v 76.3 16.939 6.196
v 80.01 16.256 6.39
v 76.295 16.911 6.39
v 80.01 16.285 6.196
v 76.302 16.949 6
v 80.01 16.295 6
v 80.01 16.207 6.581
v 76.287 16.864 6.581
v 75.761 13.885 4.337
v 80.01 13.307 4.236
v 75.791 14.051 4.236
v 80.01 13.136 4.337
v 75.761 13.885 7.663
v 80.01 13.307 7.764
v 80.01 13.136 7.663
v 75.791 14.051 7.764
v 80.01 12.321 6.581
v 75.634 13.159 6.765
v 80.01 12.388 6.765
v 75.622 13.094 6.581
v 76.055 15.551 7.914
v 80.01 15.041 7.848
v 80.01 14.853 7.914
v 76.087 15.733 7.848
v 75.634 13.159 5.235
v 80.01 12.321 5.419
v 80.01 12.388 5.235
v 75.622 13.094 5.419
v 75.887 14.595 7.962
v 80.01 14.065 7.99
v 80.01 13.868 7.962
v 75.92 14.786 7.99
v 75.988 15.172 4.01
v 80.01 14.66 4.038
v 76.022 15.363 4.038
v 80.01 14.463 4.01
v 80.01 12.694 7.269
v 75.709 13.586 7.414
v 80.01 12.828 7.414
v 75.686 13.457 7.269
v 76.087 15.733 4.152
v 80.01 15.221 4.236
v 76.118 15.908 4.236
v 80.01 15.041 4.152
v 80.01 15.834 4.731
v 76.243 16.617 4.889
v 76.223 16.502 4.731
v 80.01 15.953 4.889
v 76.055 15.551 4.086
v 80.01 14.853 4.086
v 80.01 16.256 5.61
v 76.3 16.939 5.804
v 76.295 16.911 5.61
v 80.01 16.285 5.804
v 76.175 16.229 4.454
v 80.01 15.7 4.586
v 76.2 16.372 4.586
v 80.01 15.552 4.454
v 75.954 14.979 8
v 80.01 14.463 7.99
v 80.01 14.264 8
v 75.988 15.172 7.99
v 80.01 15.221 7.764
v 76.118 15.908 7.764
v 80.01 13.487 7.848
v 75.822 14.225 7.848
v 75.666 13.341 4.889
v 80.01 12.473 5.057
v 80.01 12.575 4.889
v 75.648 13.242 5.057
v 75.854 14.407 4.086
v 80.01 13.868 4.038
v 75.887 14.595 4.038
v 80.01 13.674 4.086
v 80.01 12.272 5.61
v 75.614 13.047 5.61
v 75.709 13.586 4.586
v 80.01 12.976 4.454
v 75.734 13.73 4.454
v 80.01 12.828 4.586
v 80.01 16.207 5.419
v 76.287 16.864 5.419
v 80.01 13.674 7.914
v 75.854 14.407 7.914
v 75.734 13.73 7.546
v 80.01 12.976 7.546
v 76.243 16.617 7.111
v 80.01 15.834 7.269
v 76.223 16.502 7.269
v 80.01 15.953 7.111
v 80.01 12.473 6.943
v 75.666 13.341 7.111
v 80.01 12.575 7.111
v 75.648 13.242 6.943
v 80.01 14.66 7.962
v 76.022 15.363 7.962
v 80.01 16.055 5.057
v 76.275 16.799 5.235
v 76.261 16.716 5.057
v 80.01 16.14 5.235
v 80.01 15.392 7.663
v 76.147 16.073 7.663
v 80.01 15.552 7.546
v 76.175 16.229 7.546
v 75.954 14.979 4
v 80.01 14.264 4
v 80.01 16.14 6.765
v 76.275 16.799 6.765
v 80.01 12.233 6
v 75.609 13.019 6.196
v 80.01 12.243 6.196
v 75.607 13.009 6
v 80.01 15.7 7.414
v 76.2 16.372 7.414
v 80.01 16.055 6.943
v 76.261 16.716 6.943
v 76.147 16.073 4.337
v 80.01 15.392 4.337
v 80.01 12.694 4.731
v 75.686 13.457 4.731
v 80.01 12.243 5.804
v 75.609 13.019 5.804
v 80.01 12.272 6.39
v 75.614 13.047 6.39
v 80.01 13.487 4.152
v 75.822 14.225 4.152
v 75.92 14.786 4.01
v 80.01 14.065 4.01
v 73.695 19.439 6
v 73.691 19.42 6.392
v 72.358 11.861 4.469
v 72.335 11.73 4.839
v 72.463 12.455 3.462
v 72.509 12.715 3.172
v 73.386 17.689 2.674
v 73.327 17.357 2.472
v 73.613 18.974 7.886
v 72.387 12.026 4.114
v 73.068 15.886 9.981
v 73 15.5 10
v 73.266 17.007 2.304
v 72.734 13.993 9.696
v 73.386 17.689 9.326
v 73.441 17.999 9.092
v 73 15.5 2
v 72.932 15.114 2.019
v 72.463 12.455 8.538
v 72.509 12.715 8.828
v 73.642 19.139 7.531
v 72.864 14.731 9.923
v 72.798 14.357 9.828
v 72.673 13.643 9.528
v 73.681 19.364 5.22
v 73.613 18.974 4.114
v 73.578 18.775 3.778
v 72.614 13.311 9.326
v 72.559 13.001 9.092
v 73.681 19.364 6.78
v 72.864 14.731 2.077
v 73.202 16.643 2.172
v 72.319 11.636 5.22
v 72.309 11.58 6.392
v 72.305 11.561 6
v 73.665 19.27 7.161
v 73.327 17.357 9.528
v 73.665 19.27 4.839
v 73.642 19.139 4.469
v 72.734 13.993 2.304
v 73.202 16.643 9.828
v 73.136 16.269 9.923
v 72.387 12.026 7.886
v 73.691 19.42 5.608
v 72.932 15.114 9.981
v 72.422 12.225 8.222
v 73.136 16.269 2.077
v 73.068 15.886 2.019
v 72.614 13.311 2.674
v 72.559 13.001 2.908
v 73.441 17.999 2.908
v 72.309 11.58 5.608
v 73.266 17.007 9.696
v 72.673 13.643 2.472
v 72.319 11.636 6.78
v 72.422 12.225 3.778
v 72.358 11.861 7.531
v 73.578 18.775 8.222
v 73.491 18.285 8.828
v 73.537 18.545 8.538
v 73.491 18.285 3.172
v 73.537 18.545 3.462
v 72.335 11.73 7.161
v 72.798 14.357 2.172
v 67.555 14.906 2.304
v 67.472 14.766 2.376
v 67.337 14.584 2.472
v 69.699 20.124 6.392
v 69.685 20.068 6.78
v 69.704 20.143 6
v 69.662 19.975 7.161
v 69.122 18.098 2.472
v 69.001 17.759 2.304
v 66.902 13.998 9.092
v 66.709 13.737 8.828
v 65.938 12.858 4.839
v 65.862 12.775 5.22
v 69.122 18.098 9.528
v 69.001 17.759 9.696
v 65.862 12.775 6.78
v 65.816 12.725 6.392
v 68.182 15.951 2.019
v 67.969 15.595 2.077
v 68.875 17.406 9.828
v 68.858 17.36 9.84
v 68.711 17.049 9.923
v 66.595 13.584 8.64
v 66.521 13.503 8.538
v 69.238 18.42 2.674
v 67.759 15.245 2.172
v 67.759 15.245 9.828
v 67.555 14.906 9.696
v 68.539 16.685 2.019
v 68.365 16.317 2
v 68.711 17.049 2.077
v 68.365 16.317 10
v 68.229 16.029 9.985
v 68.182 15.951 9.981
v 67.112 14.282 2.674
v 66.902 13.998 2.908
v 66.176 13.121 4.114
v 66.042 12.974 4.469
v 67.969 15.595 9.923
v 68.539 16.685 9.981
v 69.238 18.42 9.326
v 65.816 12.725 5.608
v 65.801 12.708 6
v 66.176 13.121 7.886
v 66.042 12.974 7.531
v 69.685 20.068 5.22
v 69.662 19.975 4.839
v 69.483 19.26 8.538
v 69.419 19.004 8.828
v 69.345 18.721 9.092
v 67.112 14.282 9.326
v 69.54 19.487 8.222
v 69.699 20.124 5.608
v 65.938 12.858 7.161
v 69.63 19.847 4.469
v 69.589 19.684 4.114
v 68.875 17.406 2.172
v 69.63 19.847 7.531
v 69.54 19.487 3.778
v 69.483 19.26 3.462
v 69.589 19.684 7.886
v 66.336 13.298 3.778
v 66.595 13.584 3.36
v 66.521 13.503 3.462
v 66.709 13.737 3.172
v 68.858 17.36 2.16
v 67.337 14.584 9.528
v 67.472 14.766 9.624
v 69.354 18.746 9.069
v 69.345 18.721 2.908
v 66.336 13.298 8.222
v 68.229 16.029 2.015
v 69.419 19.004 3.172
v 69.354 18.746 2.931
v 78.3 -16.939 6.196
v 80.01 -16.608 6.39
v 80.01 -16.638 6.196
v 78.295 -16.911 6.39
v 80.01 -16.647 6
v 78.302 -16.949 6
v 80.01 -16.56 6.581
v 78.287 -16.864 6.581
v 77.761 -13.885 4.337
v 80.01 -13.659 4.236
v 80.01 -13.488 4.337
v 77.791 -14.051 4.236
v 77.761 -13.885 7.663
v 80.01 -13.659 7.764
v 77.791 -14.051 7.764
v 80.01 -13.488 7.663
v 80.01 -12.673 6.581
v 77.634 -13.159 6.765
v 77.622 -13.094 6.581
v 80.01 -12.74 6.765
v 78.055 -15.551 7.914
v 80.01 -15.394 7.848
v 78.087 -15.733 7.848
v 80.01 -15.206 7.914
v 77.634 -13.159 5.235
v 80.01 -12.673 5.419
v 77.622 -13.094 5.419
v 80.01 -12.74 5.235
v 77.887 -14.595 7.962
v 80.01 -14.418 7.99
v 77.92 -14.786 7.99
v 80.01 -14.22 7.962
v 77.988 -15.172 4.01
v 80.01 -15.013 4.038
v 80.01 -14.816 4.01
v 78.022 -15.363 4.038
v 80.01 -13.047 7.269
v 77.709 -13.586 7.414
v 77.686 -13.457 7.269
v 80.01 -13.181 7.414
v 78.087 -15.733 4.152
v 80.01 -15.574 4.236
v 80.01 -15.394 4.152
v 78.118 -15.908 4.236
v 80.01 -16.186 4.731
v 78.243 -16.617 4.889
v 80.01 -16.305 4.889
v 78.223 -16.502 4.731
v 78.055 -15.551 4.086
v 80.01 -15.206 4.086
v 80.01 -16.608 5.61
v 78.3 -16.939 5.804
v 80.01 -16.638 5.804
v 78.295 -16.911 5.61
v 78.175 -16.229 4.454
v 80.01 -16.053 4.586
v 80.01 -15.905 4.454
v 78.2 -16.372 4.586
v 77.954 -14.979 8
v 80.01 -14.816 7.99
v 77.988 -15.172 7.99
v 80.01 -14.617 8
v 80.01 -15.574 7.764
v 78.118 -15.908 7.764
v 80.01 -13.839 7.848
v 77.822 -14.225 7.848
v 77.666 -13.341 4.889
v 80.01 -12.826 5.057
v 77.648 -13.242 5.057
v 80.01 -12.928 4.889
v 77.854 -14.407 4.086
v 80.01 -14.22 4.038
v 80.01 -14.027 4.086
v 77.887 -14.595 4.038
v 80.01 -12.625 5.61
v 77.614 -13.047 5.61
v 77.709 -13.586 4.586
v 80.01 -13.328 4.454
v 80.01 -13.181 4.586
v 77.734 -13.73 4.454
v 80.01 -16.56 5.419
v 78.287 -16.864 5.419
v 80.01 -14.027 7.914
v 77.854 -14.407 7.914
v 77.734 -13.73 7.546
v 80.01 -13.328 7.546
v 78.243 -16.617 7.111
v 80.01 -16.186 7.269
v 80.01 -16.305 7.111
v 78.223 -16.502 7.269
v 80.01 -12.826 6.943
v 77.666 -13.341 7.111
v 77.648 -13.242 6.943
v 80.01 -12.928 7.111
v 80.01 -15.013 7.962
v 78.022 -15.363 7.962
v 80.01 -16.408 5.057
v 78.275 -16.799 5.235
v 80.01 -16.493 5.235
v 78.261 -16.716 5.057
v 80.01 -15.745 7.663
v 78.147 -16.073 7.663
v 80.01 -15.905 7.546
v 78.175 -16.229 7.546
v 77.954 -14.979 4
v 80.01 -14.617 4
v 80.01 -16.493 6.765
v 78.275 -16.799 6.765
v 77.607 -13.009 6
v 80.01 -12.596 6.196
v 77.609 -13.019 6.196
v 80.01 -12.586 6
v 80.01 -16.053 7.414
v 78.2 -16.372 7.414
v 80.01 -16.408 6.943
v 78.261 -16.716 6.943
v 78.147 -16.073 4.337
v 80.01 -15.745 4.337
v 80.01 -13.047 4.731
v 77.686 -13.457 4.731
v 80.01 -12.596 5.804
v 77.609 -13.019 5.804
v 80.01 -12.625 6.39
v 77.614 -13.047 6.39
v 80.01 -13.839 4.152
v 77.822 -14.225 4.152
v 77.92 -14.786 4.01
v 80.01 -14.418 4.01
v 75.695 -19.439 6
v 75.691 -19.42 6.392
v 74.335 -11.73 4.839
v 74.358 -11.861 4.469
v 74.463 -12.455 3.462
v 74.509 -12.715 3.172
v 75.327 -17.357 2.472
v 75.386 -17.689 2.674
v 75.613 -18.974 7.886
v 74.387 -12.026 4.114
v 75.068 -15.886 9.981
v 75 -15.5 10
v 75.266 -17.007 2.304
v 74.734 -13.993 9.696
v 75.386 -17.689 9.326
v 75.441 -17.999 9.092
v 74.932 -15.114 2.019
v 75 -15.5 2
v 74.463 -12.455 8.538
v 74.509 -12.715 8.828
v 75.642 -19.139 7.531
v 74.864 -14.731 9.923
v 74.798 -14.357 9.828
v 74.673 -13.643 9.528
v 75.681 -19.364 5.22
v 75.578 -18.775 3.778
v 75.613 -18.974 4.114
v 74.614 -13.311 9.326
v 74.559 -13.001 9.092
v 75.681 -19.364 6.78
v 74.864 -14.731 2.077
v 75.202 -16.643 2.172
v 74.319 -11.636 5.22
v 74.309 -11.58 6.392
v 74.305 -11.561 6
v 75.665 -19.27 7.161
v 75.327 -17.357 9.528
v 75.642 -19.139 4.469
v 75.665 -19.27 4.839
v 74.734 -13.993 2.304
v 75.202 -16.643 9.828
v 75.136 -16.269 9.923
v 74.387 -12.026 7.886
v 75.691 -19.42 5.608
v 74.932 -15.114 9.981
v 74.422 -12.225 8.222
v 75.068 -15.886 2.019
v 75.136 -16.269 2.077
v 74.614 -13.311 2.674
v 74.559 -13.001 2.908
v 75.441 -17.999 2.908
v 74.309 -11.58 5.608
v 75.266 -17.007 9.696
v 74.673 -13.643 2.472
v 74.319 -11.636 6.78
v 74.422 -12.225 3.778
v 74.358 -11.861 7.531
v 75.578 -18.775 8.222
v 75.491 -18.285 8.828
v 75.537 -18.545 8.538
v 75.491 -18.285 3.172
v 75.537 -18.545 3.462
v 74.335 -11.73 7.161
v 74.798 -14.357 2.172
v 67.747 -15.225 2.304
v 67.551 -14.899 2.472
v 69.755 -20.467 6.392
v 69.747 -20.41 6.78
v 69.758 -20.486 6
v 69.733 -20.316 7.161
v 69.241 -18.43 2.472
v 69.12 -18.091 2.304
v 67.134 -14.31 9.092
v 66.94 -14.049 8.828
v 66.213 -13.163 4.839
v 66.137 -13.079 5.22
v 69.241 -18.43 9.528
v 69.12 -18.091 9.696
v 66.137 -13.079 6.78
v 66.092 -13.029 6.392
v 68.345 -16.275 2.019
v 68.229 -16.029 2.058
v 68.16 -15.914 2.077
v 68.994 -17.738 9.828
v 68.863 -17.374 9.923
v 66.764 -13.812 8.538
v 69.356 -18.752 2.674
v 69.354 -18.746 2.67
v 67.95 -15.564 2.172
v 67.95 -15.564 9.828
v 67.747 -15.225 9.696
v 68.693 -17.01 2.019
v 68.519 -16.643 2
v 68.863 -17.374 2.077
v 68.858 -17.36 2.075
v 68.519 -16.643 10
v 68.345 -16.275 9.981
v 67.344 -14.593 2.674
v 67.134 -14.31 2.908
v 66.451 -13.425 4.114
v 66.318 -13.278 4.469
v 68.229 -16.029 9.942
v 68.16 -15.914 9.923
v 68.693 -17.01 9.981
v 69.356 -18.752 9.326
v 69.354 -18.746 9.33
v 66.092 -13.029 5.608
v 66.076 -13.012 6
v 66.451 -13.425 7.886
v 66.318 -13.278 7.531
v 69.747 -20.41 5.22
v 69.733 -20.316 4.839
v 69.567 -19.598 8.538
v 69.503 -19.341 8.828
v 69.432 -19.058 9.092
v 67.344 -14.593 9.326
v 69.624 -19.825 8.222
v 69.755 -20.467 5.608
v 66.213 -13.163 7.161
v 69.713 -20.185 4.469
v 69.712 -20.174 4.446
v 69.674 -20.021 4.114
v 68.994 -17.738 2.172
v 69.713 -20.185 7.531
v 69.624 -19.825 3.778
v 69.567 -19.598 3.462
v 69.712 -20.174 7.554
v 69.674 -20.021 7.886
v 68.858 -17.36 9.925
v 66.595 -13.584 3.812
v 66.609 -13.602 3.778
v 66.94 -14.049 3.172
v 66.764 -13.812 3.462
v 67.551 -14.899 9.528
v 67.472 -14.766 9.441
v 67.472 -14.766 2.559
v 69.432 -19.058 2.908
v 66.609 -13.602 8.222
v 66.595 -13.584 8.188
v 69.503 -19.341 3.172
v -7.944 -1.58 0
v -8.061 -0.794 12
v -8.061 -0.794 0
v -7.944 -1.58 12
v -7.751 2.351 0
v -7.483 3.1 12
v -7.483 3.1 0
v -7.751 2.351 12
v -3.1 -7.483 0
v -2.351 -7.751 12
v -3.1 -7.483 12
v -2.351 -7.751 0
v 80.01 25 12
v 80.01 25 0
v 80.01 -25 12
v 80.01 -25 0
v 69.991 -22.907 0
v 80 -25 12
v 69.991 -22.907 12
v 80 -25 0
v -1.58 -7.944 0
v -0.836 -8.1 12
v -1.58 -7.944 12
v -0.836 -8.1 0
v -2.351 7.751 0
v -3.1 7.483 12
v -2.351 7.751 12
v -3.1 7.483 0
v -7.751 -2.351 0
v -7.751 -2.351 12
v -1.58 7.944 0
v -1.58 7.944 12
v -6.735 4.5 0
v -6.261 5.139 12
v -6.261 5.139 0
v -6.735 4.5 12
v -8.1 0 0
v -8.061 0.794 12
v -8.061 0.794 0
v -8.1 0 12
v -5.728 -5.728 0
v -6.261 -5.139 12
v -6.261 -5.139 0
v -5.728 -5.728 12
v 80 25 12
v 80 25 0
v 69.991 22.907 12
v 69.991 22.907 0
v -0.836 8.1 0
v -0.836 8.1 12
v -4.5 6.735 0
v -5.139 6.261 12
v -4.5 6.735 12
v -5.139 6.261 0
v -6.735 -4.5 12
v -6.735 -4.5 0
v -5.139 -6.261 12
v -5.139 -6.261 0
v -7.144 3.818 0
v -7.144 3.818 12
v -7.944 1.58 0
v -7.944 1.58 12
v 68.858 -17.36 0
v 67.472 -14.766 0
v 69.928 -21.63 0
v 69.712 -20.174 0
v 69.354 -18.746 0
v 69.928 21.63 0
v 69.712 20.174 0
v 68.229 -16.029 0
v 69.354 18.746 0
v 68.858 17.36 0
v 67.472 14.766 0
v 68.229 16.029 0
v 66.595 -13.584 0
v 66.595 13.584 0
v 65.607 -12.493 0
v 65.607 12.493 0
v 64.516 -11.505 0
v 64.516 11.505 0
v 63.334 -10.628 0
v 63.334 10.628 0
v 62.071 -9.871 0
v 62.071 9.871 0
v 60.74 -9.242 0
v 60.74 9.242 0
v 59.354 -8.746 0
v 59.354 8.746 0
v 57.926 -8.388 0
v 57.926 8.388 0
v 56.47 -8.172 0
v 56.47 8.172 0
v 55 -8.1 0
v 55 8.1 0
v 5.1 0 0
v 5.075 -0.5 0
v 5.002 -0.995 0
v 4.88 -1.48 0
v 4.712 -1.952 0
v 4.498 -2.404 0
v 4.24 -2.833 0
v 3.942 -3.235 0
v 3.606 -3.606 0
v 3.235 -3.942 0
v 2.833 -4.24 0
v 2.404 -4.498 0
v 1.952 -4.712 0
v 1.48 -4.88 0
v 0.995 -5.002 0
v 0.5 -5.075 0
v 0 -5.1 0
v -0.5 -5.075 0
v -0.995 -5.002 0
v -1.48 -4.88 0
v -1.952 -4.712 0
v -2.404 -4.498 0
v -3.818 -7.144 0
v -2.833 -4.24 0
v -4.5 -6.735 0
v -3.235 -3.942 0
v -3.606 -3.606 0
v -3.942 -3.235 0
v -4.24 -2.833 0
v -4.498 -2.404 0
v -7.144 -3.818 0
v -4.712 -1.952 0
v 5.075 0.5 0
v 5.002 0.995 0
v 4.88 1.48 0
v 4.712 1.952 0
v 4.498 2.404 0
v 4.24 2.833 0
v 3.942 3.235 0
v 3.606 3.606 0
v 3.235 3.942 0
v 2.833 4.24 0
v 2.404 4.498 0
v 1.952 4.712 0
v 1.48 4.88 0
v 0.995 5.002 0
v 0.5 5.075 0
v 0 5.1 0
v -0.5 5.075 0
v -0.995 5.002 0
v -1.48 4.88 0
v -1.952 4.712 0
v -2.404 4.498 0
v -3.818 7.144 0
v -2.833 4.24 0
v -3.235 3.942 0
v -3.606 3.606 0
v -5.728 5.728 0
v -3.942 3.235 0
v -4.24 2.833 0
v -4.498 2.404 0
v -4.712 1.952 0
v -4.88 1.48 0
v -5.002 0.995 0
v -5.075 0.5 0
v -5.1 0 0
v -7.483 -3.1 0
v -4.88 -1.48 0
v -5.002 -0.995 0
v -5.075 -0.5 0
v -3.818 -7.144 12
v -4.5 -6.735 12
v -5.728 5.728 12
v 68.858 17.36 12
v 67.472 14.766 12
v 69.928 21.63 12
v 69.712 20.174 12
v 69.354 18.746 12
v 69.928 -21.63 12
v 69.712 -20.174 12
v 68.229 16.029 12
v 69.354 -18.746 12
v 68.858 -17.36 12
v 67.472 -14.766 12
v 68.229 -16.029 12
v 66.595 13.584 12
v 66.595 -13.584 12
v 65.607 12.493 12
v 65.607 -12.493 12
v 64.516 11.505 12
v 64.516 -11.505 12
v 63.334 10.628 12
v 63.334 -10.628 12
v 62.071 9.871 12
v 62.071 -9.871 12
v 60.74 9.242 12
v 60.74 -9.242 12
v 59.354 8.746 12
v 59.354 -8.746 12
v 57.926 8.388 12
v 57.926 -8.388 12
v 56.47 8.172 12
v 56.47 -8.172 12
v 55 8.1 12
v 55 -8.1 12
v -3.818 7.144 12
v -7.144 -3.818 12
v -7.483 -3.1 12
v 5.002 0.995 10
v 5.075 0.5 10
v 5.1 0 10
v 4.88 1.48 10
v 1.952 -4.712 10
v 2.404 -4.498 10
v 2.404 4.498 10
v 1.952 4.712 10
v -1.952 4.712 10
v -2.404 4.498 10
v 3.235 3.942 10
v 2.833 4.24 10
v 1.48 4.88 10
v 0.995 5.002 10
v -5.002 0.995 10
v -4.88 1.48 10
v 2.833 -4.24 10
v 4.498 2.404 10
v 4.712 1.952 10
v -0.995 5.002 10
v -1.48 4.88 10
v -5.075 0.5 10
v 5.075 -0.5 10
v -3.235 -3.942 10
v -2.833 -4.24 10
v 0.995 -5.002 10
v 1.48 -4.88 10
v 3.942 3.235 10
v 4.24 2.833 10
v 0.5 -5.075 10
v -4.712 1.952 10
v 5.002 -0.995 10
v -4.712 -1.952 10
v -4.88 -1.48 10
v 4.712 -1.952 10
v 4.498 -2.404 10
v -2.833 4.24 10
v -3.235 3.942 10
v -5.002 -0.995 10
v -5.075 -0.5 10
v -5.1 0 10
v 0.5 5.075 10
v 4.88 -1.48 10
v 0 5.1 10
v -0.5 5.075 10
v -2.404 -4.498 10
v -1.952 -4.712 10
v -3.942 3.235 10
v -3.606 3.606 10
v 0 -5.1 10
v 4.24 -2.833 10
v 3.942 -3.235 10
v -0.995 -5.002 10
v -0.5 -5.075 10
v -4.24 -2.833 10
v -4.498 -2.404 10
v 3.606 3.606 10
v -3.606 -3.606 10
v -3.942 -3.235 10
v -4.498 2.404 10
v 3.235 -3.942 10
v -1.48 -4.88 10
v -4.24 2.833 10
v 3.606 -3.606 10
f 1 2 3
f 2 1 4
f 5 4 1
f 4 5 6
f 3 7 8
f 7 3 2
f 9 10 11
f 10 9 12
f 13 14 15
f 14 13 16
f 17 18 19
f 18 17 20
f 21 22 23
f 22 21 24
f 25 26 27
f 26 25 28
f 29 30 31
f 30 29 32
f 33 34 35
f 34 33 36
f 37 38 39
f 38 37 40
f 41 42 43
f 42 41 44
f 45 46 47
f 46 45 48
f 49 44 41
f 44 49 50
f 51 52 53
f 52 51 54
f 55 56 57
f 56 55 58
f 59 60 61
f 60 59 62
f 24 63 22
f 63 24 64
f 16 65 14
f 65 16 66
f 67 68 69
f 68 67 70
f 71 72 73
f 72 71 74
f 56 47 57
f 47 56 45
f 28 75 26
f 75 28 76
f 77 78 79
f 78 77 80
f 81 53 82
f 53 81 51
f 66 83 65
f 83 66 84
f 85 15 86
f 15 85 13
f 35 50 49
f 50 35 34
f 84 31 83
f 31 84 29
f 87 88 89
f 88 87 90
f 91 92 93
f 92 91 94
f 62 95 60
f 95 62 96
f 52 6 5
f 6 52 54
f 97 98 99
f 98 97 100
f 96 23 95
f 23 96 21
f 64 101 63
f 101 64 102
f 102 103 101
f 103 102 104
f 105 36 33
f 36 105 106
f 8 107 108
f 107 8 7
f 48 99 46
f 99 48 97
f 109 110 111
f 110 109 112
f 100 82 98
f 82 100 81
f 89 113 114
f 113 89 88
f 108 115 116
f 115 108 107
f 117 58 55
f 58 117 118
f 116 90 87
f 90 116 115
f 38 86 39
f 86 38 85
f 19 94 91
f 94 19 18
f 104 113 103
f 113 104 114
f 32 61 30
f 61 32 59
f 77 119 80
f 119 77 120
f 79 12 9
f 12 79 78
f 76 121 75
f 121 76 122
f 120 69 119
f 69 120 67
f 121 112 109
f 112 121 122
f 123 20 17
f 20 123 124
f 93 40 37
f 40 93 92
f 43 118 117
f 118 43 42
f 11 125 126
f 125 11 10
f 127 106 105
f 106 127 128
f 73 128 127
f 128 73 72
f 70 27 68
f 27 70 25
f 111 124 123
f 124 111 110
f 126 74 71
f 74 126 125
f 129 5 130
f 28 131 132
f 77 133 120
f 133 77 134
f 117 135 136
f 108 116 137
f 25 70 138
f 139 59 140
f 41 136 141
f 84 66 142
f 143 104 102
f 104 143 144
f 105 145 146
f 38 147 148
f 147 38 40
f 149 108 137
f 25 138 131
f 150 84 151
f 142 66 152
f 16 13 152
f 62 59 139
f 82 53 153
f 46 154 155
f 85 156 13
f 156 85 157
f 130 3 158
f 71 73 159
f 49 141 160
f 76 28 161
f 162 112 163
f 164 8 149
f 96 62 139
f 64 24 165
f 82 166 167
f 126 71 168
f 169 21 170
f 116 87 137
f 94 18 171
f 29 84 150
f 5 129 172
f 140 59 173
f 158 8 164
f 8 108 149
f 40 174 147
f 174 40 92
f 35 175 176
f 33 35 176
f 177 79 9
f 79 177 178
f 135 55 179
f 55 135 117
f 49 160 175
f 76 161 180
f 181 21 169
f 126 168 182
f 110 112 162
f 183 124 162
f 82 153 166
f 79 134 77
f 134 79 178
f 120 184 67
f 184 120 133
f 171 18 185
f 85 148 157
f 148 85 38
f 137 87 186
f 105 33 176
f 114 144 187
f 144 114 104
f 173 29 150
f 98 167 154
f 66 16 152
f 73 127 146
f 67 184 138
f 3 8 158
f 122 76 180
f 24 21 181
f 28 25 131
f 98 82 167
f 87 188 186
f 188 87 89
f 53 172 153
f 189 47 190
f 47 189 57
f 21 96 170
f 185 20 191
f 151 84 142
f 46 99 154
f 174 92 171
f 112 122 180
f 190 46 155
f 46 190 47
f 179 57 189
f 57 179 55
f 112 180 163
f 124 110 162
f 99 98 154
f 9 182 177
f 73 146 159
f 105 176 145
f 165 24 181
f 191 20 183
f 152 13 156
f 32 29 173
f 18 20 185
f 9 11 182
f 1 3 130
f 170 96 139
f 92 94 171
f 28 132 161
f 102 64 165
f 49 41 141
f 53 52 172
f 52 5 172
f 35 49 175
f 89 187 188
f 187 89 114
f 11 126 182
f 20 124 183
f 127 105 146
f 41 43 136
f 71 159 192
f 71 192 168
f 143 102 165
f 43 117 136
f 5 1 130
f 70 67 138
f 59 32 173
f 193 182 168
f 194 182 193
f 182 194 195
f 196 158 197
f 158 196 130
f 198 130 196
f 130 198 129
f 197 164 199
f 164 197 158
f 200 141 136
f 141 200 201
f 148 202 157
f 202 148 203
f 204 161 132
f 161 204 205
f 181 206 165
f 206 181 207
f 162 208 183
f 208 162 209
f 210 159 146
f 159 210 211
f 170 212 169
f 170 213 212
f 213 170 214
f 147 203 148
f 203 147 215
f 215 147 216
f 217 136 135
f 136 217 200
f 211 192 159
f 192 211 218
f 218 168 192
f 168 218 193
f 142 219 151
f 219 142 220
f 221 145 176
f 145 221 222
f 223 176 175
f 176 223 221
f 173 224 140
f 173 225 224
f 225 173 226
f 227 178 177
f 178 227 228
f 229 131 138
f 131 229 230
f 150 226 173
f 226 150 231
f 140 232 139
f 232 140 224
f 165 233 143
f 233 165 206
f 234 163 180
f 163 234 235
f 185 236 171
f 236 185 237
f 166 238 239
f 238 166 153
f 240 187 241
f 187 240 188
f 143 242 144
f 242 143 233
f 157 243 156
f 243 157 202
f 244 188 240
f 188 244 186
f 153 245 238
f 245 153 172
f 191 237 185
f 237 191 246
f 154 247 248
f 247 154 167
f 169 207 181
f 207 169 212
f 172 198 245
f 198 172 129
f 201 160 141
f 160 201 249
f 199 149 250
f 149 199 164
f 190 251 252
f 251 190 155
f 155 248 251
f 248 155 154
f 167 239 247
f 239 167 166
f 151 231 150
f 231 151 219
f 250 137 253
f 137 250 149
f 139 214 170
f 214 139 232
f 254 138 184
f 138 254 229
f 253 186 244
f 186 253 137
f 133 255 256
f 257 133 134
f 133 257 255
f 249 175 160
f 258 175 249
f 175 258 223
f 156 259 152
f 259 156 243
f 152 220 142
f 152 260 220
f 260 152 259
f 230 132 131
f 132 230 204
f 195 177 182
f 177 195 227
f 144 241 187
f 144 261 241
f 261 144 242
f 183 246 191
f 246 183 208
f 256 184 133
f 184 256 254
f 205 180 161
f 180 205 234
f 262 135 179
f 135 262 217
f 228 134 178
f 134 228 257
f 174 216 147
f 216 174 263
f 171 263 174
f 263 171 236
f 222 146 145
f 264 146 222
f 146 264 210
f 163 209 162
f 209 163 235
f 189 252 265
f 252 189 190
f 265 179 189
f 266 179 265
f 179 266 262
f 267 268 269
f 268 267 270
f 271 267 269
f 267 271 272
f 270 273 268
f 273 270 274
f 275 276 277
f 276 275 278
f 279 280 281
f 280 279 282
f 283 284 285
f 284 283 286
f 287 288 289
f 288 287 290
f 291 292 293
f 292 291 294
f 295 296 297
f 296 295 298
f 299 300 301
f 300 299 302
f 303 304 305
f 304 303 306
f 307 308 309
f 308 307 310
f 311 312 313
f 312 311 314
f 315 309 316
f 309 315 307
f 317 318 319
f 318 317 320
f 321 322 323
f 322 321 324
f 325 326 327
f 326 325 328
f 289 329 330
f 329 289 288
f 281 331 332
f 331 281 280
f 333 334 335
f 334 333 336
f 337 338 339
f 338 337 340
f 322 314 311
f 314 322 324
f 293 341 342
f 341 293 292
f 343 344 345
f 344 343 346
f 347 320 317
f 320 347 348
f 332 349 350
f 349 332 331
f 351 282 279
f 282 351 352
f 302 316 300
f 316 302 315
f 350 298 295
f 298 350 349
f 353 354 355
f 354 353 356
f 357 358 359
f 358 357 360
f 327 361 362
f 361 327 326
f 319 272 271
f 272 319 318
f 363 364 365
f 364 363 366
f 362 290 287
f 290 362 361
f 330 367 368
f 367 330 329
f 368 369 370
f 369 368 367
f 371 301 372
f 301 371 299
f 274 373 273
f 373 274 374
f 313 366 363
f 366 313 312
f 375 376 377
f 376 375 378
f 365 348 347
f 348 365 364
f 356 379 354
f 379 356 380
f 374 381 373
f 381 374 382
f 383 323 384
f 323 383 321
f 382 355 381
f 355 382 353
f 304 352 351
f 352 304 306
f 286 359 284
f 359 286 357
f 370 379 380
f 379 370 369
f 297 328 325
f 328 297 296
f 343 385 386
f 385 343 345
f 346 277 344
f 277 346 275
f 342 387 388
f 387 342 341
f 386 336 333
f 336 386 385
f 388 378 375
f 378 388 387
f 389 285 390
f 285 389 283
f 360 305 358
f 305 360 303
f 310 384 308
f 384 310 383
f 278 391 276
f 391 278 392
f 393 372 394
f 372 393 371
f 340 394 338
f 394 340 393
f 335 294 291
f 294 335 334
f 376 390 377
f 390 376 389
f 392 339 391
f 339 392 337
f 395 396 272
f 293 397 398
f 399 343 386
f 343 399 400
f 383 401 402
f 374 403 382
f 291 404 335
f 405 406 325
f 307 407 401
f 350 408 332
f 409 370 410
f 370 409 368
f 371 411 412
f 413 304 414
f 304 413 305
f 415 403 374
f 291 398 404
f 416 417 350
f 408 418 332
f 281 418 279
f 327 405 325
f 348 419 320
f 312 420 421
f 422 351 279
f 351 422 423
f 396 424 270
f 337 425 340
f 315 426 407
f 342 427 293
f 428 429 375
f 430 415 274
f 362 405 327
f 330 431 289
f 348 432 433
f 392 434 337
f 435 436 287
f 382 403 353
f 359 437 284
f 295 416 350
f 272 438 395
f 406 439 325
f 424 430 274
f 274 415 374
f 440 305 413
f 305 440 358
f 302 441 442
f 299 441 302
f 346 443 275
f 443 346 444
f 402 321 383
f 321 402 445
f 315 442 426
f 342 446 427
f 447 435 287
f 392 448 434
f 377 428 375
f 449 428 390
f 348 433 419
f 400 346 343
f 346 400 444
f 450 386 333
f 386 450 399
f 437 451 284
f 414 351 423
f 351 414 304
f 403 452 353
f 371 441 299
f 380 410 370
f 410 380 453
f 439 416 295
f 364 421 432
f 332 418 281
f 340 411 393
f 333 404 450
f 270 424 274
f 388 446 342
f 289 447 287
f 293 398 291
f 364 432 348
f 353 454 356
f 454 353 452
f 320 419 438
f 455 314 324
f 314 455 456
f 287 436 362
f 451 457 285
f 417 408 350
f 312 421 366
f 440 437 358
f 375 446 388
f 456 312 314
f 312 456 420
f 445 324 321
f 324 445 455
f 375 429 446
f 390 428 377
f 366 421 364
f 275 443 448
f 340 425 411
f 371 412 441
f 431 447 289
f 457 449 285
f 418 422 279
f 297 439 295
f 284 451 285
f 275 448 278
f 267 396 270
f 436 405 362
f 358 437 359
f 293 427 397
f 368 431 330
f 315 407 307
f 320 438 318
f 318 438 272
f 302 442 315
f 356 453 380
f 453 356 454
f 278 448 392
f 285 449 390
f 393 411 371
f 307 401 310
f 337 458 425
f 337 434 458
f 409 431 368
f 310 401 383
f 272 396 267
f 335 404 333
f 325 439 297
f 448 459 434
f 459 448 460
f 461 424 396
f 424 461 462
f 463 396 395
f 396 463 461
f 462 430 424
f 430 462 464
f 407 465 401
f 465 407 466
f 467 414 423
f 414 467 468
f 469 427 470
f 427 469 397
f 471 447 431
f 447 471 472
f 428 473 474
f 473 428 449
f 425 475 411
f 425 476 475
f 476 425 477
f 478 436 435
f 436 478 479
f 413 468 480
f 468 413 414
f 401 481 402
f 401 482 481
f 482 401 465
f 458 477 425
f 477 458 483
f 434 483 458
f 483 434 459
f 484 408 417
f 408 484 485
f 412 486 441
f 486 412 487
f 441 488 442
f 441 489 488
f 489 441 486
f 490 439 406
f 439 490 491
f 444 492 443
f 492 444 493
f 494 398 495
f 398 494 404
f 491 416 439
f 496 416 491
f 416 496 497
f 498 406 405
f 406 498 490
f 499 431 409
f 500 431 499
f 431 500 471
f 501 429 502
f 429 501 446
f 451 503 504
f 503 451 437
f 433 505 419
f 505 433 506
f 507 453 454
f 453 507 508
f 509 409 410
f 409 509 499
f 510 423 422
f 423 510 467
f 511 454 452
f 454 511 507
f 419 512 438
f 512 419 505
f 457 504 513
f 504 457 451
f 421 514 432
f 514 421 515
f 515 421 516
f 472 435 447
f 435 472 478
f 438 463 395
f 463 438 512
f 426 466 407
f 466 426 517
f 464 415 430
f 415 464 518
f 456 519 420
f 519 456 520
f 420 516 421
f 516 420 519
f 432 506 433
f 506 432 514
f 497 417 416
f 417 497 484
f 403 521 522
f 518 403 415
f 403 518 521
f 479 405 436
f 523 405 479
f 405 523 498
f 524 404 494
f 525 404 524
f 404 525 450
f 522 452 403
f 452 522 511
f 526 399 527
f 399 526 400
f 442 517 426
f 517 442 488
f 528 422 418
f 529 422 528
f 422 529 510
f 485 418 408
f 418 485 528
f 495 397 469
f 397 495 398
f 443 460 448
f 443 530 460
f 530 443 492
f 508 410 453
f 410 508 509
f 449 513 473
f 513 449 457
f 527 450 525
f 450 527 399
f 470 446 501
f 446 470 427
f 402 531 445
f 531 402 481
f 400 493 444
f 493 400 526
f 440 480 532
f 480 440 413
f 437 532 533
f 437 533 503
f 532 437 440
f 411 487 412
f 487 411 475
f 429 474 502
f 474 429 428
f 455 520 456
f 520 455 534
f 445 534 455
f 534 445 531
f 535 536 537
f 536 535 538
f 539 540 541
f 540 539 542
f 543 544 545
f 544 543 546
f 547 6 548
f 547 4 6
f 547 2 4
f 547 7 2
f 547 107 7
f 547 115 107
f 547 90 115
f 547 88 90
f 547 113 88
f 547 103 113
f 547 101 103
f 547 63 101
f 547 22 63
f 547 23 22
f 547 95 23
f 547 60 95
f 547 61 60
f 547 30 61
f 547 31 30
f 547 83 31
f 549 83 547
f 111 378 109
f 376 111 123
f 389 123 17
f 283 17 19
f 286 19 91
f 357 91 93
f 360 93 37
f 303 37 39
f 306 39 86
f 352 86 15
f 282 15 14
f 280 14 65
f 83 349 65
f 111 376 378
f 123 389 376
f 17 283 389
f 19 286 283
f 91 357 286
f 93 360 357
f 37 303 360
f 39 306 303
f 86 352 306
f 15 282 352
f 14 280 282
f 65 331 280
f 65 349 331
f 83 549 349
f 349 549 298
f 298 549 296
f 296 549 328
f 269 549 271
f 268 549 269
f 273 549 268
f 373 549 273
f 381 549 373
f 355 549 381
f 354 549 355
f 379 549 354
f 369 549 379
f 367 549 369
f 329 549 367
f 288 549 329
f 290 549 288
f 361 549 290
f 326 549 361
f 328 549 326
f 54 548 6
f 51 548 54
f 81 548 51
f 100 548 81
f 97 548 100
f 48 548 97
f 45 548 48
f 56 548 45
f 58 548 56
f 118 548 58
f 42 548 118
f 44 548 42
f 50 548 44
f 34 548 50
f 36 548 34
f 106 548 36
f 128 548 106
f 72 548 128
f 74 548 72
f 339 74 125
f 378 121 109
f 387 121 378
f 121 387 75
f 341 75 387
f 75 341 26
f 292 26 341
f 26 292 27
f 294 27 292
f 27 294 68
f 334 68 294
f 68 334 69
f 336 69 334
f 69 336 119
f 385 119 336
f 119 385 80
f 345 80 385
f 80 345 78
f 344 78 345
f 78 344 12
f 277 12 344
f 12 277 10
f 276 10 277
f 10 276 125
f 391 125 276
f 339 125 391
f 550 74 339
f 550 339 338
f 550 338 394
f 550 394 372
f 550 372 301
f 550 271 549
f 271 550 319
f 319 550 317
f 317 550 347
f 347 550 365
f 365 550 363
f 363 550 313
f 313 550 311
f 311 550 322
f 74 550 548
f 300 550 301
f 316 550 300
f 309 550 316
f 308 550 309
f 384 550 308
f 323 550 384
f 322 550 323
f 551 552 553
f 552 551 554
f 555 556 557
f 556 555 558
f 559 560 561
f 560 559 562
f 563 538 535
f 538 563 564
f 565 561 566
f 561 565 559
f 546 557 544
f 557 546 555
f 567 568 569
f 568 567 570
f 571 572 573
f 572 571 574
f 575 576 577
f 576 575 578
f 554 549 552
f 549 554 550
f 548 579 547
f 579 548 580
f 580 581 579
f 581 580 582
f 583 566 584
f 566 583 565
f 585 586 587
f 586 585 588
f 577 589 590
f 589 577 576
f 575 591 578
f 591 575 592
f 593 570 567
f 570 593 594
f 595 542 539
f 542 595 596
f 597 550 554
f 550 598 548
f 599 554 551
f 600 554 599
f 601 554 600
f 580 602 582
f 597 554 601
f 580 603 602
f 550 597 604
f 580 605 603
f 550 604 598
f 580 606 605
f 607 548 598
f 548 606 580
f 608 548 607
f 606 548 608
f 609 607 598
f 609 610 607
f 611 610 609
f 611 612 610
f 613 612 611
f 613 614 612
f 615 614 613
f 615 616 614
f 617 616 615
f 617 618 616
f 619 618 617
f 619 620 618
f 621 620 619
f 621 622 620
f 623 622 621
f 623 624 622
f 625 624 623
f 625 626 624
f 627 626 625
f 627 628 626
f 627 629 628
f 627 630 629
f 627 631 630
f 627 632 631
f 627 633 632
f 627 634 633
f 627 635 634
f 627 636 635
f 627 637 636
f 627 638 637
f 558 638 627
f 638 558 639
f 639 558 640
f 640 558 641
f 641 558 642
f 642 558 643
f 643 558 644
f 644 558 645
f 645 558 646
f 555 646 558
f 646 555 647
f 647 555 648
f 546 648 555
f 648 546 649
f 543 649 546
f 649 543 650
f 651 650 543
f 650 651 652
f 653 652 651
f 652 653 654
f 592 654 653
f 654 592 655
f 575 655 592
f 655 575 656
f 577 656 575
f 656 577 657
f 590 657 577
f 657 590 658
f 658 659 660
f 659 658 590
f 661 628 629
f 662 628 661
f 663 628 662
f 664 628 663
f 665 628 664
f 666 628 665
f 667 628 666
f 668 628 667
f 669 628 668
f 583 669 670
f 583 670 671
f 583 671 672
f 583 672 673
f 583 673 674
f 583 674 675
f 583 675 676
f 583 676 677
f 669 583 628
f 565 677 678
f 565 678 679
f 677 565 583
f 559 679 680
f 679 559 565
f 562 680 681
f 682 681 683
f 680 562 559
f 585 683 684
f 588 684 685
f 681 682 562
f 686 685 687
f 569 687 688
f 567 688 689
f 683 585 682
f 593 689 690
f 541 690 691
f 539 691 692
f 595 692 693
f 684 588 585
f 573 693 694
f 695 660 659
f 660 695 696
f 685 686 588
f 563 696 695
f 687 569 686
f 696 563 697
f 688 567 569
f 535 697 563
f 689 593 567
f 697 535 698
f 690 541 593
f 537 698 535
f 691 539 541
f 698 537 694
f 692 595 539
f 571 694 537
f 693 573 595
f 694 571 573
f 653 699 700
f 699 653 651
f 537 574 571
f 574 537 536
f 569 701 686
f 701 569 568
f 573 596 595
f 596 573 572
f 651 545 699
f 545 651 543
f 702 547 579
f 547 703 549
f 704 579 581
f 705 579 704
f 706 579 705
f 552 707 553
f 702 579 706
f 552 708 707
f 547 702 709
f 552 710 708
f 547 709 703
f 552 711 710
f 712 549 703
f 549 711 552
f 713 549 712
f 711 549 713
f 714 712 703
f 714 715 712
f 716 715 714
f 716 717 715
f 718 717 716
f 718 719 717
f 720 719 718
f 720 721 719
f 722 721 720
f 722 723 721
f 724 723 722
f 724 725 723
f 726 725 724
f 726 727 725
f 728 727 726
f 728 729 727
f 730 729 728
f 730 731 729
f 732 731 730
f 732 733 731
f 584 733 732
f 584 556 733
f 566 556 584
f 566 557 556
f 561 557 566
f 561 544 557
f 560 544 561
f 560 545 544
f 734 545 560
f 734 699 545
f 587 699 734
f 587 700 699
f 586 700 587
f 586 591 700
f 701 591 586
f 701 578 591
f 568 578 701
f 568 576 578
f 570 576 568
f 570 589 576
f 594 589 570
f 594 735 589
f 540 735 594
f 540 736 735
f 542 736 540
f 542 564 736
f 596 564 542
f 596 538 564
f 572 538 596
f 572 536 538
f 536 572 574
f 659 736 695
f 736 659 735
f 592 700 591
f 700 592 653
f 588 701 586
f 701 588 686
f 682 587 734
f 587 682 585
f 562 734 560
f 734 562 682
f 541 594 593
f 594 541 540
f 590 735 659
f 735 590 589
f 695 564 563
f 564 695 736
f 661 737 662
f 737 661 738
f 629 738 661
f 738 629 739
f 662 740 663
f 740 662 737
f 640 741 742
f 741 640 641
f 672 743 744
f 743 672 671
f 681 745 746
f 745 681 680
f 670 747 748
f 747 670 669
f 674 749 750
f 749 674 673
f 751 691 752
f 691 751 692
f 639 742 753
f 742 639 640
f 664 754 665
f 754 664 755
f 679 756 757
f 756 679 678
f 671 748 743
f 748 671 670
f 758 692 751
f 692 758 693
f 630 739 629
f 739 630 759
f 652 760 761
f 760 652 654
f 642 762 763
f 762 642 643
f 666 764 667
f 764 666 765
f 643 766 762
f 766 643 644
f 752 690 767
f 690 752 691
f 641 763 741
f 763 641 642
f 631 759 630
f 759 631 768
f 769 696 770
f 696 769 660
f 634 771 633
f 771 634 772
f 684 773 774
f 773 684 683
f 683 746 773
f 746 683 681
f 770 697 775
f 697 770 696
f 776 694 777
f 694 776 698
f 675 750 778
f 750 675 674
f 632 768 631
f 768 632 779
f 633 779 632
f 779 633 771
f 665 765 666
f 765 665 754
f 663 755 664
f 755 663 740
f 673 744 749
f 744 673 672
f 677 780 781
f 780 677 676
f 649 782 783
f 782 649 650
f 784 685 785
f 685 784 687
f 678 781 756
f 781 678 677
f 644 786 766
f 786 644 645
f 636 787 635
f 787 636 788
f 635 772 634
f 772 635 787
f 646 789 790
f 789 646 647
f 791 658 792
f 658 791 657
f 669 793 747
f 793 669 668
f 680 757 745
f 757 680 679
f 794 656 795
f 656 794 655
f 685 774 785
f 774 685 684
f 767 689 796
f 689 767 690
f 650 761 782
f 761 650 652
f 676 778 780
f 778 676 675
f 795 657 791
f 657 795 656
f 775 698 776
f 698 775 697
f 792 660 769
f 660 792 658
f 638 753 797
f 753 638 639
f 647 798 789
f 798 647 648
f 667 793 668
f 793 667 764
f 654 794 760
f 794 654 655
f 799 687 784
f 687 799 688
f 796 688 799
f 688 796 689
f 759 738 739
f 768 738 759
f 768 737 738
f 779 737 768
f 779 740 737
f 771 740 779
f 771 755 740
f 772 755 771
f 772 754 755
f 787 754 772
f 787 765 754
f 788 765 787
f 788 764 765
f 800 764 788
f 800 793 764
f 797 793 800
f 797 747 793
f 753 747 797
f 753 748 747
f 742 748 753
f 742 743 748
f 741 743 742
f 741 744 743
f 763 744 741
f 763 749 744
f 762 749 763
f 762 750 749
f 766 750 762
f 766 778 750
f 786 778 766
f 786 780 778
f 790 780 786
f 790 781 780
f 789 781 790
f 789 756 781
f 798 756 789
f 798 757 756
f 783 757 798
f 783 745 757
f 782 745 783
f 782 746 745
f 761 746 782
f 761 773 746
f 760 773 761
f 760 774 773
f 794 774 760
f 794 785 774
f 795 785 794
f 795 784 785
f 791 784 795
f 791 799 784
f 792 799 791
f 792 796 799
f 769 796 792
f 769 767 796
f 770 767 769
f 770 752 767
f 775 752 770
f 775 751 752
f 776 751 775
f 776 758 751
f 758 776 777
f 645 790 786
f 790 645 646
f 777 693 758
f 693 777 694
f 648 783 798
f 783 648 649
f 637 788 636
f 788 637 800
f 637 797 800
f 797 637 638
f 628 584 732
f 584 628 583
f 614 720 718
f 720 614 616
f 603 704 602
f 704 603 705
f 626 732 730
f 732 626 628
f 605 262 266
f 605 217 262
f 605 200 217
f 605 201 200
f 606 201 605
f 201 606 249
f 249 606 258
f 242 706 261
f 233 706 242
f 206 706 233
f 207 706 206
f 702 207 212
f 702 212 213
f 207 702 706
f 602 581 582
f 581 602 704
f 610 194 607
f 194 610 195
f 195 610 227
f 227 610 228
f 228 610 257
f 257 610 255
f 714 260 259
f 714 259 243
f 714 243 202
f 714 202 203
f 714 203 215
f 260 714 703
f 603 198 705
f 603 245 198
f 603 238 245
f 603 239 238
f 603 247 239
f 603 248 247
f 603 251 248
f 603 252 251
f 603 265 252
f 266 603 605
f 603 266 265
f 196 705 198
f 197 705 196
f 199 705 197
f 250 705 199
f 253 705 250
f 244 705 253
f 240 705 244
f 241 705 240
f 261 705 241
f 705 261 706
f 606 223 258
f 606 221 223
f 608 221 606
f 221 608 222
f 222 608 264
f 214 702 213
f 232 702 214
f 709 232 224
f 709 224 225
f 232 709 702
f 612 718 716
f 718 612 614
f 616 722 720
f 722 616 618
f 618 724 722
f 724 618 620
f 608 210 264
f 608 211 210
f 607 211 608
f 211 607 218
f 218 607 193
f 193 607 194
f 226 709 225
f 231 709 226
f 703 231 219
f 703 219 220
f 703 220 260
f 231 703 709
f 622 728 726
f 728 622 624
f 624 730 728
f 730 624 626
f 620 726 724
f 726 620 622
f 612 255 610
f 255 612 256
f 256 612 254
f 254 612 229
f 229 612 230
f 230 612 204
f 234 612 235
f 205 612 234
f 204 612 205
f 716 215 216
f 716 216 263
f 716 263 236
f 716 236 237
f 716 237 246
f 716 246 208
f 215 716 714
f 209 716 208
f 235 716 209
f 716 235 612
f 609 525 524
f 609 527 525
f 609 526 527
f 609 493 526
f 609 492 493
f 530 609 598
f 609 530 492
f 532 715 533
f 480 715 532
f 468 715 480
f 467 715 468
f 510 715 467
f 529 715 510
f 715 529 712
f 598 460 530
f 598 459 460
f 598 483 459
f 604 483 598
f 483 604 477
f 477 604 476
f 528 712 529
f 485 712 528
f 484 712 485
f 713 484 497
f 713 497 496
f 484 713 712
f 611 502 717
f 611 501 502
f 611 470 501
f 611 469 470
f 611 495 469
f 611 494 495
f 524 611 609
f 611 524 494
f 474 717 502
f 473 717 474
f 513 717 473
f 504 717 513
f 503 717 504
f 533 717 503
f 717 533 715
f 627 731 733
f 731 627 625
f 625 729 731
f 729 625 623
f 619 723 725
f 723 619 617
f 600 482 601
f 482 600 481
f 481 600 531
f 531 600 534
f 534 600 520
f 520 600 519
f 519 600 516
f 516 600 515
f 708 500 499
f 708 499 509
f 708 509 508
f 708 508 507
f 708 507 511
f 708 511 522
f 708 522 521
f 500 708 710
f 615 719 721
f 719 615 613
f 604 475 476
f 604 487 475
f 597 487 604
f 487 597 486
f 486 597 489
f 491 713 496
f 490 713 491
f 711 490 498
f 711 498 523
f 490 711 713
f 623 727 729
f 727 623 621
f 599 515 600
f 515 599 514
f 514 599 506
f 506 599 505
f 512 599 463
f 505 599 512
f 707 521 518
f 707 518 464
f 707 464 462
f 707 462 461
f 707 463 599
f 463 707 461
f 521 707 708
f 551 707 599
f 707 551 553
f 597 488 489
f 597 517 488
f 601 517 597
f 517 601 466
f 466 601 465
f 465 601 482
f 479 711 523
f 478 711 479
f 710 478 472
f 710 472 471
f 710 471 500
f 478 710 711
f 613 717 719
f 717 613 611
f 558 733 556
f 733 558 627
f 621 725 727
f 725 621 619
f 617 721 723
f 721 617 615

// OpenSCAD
$fn=64;
Lw=80; //расстояние от стены
Dt=10.2; //диаметр трубки
DtH=10; //высота охвата трубки
WL=50;//длина планки
WH=10;//толщина планки
HH=DtH+2;

dOkr=30; //скругление у основания

//cylinder(d=Dt+3*2,h=DtH);
//translate([Lw,-WL/2,0])cube([WH,WL,DtH]);
module shHole(diam){
    cylinder(d=diam,h=40);
        cylinder(d1=diam+4,d2=diam,h=3);
        translate([0,0,-80])cylinder(d=diam+4,h=80);
}

difference(){
    hull(){
        cylinder(d=Dt+3*2,h=HH);
        scale([1,1,1])translate([Lw,-WL/2,0])cube([0.01,WL,HH]);
    }
    cylinder(d=Dt,h=DtH);
    translate([Lw-7,WL/4+3,HH/2])rotate([90,0,90-10]){
        shHole(4);
    }
    
    mirror([0,1,0])translate([Lw-5,WL/4+3,HH/2])rotate([90,0,90-10]){
        shHole(4);
    }
    
    
    
    hull(){
        
        translate([Lw-WH-dOkr/2,(Dt+6)/2+dOkr/2,-0.01])cylinder(d=dOkr,h=HH+0.02);
        translate([-10,(Dt+6)/2+dOkr/2,-0.01])cylinder(d=dOkr,h=HH+0.02);
        
        
    }
    mirror([0,1,0])hull(){
        translate([Lw-WH-dOkr/2,(Dt+6)/2+dOkr/2,-0.01])cylinder(d=dOkr,h=HH+0.02);
        translate([-10,(Dt+6)/2+dOkr/2,-0.01])cylinder(d=dOkr,h=HH+0.02);
        
    }
}
